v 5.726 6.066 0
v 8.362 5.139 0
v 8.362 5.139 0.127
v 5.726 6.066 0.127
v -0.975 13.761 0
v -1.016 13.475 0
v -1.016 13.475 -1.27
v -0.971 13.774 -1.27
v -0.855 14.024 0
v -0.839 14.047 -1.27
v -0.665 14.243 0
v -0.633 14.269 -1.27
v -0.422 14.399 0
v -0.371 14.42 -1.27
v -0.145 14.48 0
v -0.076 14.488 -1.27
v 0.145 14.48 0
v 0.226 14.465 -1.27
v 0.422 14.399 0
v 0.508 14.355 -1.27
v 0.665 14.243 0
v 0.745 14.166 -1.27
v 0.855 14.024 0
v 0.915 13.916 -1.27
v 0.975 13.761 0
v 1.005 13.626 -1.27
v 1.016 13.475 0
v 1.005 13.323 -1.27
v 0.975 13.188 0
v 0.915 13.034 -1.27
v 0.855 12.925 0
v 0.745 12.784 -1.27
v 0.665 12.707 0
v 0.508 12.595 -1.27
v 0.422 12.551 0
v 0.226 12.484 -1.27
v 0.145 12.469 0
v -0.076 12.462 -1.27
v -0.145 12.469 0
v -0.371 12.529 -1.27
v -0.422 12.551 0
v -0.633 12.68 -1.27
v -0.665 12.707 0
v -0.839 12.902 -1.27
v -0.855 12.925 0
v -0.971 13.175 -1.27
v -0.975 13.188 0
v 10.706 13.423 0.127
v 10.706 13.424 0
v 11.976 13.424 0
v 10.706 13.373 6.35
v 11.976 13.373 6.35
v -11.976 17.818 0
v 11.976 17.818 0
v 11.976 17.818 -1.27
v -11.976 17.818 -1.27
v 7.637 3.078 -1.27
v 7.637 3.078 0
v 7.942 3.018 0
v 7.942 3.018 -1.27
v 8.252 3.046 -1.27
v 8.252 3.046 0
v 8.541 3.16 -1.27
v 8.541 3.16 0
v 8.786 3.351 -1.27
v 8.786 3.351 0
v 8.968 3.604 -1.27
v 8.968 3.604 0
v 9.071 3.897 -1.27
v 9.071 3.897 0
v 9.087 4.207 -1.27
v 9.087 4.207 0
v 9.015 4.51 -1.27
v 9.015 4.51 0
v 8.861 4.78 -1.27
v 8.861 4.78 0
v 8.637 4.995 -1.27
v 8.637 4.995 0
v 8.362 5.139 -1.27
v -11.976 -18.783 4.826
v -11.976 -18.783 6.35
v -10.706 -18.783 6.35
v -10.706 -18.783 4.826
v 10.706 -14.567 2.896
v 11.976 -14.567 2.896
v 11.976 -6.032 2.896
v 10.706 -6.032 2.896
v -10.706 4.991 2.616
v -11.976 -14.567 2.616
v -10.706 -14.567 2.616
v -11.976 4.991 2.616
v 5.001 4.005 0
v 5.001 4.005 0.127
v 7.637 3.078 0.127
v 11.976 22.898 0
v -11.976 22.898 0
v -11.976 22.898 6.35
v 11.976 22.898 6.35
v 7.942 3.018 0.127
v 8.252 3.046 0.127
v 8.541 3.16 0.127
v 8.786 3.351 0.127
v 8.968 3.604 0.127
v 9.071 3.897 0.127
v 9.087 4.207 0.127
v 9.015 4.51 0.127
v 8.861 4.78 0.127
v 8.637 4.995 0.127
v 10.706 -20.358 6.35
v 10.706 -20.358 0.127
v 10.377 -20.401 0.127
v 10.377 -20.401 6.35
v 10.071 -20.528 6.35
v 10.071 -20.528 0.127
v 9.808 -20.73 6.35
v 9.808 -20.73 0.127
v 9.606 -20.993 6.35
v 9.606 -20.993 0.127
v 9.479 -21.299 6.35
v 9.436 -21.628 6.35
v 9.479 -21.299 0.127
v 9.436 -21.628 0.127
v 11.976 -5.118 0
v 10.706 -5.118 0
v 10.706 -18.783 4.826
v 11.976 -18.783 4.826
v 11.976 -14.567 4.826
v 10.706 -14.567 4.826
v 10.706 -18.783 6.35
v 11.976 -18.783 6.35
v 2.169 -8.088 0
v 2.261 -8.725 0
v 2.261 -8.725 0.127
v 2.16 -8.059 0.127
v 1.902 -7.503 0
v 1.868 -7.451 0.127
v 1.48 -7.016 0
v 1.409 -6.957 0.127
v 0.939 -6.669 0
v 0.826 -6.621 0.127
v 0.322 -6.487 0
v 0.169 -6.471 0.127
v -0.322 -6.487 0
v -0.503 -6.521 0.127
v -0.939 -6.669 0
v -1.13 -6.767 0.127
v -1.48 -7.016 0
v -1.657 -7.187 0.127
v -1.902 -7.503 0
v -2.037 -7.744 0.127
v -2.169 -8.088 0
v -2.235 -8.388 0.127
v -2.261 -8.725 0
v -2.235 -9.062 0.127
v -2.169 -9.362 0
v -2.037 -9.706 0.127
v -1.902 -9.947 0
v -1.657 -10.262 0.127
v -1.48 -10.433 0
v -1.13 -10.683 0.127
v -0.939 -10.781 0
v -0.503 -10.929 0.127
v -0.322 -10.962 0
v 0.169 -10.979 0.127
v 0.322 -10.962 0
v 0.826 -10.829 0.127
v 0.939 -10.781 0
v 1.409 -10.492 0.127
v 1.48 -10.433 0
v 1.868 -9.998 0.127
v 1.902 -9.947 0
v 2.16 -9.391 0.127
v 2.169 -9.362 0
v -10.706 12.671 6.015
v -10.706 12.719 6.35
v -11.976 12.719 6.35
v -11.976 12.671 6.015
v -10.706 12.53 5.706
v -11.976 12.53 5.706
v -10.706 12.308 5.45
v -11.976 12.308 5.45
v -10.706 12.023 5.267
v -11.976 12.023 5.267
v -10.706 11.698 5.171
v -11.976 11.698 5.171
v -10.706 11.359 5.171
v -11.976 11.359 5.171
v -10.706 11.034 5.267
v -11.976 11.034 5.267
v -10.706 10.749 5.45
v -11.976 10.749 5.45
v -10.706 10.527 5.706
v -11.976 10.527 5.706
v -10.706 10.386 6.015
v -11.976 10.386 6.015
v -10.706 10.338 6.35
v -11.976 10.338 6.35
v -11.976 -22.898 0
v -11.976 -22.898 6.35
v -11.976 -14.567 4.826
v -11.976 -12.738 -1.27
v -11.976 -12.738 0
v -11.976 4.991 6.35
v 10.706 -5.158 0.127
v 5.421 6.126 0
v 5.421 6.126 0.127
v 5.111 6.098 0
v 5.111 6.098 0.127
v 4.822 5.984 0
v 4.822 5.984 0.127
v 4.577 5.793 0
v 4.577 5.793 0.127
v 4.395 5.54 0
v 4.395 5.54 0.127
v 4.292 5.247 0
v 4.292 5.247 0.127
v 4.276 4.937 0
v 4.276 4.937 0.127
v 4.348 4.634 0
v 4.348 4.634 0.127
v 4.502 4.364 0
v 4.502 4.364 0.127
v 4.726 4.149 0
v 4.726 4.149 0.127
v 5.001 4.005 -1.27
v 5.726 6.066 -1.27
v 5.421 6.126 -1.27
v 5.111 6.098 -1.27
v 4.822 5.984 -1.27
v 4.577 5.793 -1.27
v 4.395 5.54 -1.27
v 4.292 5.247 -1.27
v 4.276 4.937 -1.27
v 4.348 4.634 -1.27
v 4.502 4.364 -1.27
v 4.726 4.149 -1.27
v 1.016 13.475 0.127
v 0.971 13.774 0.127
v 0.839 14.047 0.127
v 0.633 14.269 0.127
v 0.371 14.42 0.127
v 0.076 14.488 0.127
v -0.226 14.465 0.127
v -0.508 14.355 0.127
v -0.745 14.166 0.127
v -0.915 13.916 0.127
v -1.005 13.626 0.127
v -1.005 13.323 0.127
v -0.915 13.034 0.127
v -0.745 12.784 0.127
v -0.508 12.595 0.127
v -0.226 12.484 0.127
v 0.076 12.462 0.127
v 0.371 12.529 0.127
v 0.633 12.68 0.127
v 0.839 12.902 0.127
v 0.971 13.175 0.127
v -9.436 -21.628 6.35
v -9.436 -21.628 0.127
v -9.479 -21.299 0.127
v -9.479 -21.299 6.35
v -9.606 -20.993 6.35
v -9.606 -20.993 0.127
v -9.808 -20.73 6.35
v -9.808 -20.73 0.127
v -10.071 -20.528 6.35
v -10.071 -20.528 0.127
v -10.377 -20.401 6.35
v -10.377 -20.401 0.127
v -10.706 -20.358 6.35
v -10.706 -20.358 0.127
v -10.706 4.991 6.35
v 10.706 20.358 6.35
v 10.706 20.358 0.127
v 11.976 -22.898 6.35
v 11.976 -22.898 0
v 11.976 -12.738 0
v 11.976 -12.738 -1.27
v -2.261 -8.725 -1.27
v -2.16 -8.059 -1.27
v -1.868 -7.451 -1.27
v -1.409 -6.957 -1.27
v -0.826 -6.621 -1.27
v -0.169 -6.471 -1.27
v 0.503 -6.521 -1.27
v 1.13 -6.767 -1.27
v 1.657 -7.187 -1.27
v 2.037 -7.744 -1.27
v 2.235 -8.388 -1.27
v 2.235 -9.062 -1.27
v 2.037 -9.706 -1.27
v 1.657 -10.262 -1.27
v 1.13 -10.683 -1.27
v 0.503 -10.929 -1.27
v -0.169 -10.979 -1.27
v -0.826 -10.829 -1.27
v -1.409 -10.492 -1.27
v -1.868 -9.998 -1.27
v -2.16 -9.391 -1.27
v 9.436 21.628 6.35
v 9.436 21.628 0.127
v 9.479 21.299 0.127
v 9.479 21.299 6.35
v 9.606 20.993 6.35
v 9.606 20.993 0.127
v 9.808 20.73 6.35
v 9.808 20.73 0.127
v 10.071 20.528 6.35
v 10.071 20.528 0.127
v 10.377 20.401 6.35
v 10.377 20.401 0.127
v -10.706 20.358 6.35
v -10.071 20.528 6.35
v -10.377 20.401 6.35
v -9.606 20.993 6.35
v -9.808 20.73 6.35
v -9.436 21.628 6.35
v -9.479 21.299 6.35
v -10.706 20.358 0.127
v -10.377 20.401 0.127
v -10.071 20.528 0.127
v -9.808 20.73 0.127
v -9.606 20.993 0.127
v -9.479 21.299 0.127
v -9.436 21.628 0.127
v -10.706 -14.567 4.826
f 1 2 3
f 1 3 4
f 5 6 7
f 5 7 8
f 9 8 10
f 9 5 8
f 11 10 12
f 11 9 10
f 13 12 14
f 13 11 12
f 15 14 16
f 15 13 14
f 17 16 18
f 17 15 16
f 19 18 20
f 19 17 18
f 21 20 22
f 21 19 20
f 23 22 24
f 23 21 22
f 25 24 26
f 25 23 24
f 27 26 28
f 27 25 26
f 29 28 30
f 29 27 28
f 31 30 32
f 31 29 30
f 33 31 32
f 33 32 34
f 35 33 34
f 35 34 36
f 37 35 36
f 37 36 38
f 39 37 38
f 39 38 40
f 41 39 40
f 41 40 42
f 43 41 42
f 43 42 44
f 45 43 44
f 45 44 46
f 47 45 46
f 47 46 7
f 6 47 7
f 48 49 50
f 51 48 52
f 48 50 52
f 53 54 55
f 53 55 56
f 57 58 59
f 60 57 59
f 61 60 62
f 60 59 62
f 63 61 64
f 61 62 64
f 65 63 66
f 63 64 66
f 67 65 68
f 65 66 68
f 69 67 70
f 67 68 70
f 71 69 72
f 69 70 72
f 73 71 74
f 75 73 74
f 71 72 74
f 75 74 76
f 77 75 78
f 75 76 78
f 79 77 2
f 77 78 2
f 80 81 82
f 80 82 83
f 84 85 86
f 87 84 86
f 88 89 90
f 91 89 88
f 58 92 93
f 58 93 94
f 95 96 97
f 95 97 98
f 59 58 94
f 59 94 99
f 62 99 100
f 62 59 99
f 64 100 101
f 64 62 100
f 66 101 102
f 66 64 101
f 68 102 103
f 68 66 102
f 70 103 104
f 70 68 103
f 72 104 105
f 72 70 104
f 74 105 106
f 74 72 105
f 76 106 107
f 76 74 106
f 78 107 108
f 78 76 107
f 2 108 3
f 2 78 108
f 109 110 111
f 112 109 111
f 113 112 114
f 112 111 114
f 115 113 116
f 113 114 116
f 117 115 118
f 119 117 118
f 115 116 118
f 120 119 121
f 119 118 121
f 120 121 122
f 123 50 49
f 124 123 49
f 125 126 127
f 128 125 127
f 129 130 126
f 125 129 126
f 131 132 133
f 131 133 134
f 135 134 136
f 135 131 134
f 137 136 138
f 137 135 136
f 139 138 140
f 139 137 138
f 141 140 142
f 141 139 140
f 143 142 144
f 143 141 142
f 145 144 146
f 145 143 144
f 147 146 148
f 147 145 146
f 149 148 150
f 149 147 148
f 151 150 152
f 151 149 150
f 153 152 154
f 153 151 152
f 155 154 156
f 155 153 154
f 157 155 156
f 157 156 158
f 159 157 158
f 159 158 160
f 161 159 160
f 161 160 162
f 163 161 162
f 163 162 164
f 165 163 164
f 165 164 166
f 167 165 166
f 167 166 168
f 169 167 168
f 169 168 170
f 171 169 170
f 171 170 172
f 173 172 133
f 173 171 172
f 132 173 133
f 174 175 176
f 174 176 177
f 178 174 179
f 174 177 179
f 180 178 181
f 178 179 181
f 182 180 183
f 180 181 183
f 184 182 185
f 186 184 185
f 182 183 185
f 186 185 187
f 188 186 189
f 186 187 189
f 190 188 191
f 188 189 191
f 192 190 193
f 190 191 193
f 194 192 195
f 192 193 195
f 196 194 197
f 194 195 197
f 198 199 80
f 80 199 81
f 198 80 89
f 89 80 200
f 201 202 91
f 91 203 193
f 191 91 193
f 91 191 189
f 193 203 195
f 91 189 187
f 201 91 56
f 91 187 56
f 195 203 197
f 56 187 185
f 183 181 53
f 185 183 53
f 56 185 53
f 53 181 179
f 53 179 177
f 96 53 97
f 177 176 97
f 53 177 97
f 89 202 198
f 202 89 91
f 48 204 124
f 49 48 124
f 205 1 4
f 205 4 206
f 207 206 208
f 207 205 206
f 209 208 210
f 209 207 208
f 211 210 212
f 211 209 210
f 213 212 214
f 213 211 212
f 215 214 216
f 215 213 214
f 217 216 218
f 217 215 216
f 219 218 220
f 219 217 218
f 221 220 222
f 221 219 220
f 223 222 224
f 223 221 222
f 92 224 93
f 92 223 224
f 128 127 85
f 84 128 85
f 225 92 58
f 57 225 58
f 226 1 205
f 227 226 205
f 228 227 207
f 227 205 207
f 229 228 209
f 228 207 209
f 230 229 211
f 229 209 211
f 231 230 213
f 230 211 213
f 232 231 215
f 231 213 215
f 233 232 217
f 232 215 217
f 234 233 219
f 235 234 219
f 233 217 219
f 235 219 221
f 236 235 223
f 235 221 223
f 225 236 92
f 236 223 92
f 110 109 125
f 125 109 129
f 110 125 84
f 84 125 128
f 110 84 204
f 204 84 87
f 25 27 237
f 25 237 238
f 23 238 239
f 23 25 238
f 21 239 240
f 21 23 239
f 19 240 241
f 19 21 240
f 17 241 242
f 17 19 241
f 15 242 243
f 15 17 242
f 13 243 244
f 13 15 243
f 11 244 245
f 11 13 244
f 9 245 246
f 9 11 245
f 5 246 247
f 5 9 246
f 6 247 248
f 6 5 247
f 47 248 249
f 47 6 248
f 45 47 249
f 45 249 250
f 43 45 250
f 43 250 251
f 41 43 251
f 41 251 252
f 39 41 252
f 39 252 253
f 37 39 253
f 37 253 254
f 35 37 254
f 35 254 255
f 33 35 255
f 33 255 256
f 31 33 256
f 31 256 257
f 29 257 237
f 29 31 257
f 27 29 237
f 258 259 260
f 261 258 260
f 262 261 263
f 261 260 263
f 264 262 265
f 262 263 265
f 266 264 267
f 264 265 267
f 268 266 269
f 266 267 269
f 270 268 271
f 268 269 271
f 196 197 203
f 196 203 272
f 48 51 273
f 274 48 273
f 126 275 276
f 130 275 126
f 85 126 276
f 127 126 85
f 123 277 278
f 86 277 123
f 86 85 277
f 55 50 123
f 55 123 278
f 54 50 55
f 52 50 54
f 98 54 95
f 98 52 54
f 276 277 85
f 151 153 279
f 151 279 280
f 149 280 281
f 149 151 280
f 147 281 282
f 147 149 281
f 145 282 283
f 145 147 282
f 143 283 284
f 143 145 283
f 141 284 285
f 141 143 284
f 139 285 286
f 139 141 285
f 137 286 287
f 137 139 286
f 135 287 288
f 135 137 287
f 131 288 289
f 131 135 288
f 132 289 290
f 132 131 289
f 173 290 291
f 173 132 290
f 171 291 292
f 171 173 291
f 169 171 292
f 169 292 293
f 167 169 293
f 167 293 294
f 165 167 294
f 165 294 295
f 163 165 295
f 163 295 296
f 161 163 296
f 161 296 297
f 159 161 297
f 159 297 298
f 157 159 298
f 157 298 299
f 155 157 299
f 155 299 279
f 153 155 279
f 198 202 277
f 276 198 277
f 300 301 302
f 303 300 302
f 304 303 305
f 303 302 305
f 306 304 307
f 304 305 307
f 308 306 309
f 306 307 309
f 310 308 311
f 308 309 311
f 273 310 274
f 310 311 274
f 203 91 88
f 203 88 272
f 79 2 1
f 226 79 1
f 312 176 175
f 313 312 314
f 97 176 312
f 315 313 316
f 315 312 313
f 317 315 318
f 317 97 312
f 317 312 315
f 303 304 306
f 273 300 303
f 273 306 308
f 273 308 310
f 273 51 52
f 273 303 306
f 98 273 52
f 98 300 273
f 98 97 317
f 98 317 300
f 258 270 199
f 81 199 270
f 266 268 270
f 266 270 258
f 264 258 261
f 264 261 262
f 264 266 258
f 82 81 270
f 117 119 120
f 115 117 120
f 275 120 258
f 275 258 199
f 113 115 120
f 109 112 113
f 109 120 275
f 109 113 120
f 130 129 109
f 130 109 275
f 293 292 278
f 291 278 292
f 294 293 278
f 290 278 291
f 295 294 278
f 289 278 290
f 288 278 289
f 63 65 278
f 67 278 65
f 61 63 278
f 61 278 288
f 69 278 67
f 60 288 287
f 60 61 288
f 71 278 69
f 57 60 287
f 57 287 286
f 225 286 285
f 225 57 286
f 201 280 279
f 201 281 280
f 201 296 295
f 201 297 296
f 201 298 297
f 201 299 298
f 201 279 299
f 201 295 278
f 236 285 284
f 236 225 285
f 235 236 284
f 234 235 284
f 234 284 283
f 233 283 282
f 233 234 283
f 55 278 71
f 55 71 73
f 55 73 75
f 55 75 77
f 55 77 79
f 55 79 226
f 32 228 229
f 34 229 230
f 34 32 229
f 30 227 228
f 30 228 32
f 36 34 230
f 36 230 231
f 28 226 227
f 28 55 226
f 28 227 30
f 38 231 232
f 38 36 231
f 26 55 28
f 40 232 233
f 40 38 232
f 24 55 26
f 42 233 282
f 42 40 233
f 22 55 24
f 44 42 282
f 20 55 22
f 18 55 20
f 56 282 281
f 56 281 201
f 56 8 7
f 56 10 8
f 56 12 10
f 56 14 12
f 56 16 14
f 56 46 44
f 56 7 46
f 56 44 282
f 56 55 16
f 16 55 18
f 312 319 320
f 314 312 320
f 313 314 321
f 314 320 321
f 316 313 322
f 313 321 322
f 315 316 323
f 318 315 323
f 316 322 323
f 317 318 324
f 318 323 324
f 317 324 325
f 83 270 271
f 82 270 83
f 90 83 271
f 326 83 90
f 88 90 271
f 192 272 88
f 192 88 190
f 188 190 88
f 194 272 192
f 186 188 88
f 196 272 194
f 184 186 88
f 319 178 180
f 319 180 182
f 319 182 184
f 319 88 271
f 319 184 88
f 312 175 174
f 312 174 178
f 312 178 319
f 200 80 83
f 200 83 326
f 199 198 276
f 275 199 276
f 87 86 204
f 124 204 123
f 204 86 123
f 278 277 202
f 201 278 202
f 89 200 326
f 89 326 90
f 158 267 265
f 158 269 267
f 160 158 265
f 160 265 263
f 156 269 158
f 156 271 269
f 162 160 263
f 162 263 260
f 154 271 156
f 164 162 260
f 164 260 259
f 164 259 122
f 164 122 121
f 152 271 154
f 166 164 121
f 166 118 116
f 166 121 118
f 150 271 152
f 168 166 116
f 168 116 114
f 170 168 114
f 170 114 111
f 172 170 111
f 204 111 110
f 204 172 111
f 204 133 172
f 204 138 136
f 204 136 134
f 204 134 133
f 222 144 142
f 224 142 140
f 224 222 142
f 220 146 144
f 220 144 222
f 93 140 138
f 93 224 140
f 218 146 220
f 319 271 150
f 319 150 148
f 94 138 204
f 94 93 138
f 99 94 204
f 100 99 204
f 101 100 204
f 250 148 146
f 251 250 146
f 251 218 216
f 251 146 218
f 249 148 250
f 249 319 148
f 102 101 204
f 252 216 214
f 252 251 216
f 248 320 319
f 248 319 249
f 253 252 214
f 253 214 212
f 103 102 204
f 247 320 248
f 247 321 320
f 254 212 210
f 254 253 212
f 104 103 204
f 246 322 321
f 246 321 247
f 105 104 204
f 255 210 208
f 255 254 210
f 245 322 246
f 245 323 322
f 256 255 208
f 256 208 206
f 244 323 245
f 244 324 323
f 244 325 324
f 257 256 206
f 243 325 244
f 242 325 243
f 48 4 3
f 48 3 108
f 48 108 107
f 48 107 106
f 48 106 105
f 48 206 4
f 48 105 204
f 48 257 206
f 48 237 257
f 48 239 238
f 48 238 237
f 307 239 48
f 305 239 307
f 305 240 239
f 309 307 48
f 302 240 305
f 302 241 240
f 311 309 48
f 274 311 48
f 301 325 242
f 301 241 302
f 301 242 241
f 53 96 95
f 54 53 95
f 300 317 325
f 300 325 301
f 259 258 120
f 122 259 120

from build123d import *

# Parameters (mm, degrees)
SKETCH2_W                  = 23.9522
SKETCH2_H                  = 45.7962
SKETCH2_R                  = 2.2606
SKETCH2_R_2                = 1.016
BOSS_EXTRUDE1_DEPTH        = 6.35
SKETCH4_W                  = 21.4122
SKETCH4_H                  = 43.2562
CUT_EXTRUDE1_DEPTH         = 6.223
CUT_EXTRUDE3_DEPTH         = 2.54
CUT_EXTRUDE5_DEPTH         = 1.27
BOSS_EXTRUDE3_DEPTH        = 6.223
BOSS_EXTRUDE15_OUTLINE_W   = 23.9522
BOSS_EXTRUDE15_OUTLINE_H   = 30.5562
BOSS_EXTRUDE15_OUTLINE_R   = 2.2606
BOSS_EXTRUDE15_OUTLINE_R_2 = 1.016
BOSS_EXTRUDE15_DEPTH       = 1.27
SKETCH14_R                 = 1.190625
CUT_EXTRUDE6_DEPTH         = 1.27


# Read off the part's stored shape, not the designer's step: Boss-Extrude15
with BuildPart() as part:
    # Sketch2 → Boss-Extrude1 (new body)
    with BuildSketch(Plane.XY):
        Rectangle(SKETCH2_W, SKETCH2_H)
        with Locations((0, -8.7249)):
            Circle(SKETCH2_R, mode=Mode.SUBTRACT)
        with Locations((0, 13.4747)):
            Circle(SKETCH2_R_2, mode=Mode.SUBTRACT)
        with BuildLine():
            Line((8.361518313, 5.139100055), (5.725634689, 6.065681687))
            ThreePointArc((5.725634689, 6.065681687), (4.333034634, 5.3975), (5.001216321, 4.004899945))
            Line((5.001216321, 4.004899945), (7.637099945, 3.078318313))
            ThreePointArc((7.637099945, 3.078318313), (9.0297, 3.7465), (8.361518313, 5.139100055))
        make_face(mode=Mode.SUBTRACT)
    extrude(amount=BOSS_EXTRUDE1_DEPTH)

    # Sketch4 → Cut-Extrude1 (cut)
    with BuildSketch(Plane.XY.offset(6.35)):
        Rectangle(SKETCH4_W, SKETCH4_H)
    extrude(amount=-CUT_EXTRUDE1_DEPTH, mode=Mode.SUBTRACT)

    # Sketch6 → Cut-Extrude3 (cut)
    with BuildSketch(Plane.ZY.offset(11.9761)):
        Polygon((4.826, -14.5669), (2.6162, -14.5669), (2.6162, 4.9911), (6.35, 4.9911), (6.35, -18.7833), (4.826, -18.7833), align=None)
    extrude(amount=-CUT_EXTRUDE3_DEPTH, mode=Mode.SUBTRACT)

    # Sketch8 → Cut-Extrude5 (cut)
    with BuildSketch(Plane(origin=(11.9761, 0, 0), x_dir=(0, 0, -1), z_dir=(1, 0, 0))):
        Polygon((-6.35, -18.7833), (-4.826, -18.7833), (-4.826, -14.5669), (-2.8956, -14.5669), (-2.8956, -6.0325), (0, -5.1181), (0, 13.4239), (-6.35, 13.3731), align=None)
    extrude(amount=-CUT_EXTRUDE5_DEPTH, mode=Mode.SUBTRACT)

    # Sketch10 → Boss-Extrude3 (add)
    with BuildSketch(Plane.XY.offset(0.127)):
        with BuildLine():
            ThreePointArc((-10.7061, 20.3581), (-9.808074388, 20.730074388), (-9.4361, 21.6281))
            Line((-9.4361, 21.6281), (-10.7061, 21.6281))
            Line((-10.7061, 21.6281), (-10.7061, 20.3581))
        make_face()
        with BuildLine():
            ThreePointArc((9.4361, 21.6281), (9.808074388, 20.730074388), (10.7061, 20.3581))
            Line((10.7061, 20.3581), (10.7061, 21.6281))
            Line((10.7061, 21.6281), (9.4361, 21.6281))
        make_face()
        with BuildLine():
            ThreePointArc((-9.4361, -21.6281), (-9.808074388, -20.730074388), (-10.7061, -20.3581))
            Line((-10.7061, -20.3581), (-10.7061, -21.6281))
            Line((-10.7061, -21.6281), (-9.4361, -21.6281))
        make_face()
        with BuildLine():
            Line((10.7061, -21.6281), (10.7061, -20.3581))
            ThreePointArc((10.7061, -20.3581), (9.808074388, -20.730074388), (9.4361, -21.6281))
            Line((9.4361, -21.6281), (10.7061, -21.6281))
        make_face()
    extrude(amount=BOSS_EXTRUDE3_DEPTH)

    # Boss-Extrude15 outline → Boss-Extrude15 (add)
    with BuildSketch(Plane(origin=(0, 0, 0), x_dir=(-1, 0, 0), z_dir=(0, 0, -1))):
        with Locations((0, 2.54)):
            Rectangle(BOSS_EXTRUDE15_OUTLINE_W, BOSS_EXTRUDE15_OUTLINE_H)
        with Locations((0, -8.7249)):
            Circle(BOSS_EXTRUDE15_OUTLINE_R, mode=Mode.SUBTRACT)
        with BuildLine():
            ThreePointArc((-7.637099945, 3.078318313), (-9.0297, 3.7465), (-8.361518313, 5.139100055))
            Line((-8.361518313, 5.139100055), (-5.725634689, 6.065681687))
            ThreePointArc((-5.725634689, 6.065681687), (-4.333034634, 5.3975), (-5.001216321, 4.004899945))
            Line((-5.001216321, 4.004899945), (-7.637099945, 3.078318313))
        make_face(mode=Mode.SUBTRACT)
        with Locations((0, 13.4747)):
            Circle(BOSS_EXTRUDE15_OUTLINE_R_2, mode=Mode.SUBTRACT)
    extrude(amount=BOSS_EXTRUDE15_DEPTH)

    # Sketch14 → Cut-Extrude6 (cut)
    with BuildSketch(Plane.ZY.offset(11.9761)):
        with Locations((6.35, 11.528736377)):
            Circle(SKETCH14_R)
    extrude(amount=-CUT_EXTRUDE6_DEPTH, mode=Mode.SUBTRACT)


solid = part.part
